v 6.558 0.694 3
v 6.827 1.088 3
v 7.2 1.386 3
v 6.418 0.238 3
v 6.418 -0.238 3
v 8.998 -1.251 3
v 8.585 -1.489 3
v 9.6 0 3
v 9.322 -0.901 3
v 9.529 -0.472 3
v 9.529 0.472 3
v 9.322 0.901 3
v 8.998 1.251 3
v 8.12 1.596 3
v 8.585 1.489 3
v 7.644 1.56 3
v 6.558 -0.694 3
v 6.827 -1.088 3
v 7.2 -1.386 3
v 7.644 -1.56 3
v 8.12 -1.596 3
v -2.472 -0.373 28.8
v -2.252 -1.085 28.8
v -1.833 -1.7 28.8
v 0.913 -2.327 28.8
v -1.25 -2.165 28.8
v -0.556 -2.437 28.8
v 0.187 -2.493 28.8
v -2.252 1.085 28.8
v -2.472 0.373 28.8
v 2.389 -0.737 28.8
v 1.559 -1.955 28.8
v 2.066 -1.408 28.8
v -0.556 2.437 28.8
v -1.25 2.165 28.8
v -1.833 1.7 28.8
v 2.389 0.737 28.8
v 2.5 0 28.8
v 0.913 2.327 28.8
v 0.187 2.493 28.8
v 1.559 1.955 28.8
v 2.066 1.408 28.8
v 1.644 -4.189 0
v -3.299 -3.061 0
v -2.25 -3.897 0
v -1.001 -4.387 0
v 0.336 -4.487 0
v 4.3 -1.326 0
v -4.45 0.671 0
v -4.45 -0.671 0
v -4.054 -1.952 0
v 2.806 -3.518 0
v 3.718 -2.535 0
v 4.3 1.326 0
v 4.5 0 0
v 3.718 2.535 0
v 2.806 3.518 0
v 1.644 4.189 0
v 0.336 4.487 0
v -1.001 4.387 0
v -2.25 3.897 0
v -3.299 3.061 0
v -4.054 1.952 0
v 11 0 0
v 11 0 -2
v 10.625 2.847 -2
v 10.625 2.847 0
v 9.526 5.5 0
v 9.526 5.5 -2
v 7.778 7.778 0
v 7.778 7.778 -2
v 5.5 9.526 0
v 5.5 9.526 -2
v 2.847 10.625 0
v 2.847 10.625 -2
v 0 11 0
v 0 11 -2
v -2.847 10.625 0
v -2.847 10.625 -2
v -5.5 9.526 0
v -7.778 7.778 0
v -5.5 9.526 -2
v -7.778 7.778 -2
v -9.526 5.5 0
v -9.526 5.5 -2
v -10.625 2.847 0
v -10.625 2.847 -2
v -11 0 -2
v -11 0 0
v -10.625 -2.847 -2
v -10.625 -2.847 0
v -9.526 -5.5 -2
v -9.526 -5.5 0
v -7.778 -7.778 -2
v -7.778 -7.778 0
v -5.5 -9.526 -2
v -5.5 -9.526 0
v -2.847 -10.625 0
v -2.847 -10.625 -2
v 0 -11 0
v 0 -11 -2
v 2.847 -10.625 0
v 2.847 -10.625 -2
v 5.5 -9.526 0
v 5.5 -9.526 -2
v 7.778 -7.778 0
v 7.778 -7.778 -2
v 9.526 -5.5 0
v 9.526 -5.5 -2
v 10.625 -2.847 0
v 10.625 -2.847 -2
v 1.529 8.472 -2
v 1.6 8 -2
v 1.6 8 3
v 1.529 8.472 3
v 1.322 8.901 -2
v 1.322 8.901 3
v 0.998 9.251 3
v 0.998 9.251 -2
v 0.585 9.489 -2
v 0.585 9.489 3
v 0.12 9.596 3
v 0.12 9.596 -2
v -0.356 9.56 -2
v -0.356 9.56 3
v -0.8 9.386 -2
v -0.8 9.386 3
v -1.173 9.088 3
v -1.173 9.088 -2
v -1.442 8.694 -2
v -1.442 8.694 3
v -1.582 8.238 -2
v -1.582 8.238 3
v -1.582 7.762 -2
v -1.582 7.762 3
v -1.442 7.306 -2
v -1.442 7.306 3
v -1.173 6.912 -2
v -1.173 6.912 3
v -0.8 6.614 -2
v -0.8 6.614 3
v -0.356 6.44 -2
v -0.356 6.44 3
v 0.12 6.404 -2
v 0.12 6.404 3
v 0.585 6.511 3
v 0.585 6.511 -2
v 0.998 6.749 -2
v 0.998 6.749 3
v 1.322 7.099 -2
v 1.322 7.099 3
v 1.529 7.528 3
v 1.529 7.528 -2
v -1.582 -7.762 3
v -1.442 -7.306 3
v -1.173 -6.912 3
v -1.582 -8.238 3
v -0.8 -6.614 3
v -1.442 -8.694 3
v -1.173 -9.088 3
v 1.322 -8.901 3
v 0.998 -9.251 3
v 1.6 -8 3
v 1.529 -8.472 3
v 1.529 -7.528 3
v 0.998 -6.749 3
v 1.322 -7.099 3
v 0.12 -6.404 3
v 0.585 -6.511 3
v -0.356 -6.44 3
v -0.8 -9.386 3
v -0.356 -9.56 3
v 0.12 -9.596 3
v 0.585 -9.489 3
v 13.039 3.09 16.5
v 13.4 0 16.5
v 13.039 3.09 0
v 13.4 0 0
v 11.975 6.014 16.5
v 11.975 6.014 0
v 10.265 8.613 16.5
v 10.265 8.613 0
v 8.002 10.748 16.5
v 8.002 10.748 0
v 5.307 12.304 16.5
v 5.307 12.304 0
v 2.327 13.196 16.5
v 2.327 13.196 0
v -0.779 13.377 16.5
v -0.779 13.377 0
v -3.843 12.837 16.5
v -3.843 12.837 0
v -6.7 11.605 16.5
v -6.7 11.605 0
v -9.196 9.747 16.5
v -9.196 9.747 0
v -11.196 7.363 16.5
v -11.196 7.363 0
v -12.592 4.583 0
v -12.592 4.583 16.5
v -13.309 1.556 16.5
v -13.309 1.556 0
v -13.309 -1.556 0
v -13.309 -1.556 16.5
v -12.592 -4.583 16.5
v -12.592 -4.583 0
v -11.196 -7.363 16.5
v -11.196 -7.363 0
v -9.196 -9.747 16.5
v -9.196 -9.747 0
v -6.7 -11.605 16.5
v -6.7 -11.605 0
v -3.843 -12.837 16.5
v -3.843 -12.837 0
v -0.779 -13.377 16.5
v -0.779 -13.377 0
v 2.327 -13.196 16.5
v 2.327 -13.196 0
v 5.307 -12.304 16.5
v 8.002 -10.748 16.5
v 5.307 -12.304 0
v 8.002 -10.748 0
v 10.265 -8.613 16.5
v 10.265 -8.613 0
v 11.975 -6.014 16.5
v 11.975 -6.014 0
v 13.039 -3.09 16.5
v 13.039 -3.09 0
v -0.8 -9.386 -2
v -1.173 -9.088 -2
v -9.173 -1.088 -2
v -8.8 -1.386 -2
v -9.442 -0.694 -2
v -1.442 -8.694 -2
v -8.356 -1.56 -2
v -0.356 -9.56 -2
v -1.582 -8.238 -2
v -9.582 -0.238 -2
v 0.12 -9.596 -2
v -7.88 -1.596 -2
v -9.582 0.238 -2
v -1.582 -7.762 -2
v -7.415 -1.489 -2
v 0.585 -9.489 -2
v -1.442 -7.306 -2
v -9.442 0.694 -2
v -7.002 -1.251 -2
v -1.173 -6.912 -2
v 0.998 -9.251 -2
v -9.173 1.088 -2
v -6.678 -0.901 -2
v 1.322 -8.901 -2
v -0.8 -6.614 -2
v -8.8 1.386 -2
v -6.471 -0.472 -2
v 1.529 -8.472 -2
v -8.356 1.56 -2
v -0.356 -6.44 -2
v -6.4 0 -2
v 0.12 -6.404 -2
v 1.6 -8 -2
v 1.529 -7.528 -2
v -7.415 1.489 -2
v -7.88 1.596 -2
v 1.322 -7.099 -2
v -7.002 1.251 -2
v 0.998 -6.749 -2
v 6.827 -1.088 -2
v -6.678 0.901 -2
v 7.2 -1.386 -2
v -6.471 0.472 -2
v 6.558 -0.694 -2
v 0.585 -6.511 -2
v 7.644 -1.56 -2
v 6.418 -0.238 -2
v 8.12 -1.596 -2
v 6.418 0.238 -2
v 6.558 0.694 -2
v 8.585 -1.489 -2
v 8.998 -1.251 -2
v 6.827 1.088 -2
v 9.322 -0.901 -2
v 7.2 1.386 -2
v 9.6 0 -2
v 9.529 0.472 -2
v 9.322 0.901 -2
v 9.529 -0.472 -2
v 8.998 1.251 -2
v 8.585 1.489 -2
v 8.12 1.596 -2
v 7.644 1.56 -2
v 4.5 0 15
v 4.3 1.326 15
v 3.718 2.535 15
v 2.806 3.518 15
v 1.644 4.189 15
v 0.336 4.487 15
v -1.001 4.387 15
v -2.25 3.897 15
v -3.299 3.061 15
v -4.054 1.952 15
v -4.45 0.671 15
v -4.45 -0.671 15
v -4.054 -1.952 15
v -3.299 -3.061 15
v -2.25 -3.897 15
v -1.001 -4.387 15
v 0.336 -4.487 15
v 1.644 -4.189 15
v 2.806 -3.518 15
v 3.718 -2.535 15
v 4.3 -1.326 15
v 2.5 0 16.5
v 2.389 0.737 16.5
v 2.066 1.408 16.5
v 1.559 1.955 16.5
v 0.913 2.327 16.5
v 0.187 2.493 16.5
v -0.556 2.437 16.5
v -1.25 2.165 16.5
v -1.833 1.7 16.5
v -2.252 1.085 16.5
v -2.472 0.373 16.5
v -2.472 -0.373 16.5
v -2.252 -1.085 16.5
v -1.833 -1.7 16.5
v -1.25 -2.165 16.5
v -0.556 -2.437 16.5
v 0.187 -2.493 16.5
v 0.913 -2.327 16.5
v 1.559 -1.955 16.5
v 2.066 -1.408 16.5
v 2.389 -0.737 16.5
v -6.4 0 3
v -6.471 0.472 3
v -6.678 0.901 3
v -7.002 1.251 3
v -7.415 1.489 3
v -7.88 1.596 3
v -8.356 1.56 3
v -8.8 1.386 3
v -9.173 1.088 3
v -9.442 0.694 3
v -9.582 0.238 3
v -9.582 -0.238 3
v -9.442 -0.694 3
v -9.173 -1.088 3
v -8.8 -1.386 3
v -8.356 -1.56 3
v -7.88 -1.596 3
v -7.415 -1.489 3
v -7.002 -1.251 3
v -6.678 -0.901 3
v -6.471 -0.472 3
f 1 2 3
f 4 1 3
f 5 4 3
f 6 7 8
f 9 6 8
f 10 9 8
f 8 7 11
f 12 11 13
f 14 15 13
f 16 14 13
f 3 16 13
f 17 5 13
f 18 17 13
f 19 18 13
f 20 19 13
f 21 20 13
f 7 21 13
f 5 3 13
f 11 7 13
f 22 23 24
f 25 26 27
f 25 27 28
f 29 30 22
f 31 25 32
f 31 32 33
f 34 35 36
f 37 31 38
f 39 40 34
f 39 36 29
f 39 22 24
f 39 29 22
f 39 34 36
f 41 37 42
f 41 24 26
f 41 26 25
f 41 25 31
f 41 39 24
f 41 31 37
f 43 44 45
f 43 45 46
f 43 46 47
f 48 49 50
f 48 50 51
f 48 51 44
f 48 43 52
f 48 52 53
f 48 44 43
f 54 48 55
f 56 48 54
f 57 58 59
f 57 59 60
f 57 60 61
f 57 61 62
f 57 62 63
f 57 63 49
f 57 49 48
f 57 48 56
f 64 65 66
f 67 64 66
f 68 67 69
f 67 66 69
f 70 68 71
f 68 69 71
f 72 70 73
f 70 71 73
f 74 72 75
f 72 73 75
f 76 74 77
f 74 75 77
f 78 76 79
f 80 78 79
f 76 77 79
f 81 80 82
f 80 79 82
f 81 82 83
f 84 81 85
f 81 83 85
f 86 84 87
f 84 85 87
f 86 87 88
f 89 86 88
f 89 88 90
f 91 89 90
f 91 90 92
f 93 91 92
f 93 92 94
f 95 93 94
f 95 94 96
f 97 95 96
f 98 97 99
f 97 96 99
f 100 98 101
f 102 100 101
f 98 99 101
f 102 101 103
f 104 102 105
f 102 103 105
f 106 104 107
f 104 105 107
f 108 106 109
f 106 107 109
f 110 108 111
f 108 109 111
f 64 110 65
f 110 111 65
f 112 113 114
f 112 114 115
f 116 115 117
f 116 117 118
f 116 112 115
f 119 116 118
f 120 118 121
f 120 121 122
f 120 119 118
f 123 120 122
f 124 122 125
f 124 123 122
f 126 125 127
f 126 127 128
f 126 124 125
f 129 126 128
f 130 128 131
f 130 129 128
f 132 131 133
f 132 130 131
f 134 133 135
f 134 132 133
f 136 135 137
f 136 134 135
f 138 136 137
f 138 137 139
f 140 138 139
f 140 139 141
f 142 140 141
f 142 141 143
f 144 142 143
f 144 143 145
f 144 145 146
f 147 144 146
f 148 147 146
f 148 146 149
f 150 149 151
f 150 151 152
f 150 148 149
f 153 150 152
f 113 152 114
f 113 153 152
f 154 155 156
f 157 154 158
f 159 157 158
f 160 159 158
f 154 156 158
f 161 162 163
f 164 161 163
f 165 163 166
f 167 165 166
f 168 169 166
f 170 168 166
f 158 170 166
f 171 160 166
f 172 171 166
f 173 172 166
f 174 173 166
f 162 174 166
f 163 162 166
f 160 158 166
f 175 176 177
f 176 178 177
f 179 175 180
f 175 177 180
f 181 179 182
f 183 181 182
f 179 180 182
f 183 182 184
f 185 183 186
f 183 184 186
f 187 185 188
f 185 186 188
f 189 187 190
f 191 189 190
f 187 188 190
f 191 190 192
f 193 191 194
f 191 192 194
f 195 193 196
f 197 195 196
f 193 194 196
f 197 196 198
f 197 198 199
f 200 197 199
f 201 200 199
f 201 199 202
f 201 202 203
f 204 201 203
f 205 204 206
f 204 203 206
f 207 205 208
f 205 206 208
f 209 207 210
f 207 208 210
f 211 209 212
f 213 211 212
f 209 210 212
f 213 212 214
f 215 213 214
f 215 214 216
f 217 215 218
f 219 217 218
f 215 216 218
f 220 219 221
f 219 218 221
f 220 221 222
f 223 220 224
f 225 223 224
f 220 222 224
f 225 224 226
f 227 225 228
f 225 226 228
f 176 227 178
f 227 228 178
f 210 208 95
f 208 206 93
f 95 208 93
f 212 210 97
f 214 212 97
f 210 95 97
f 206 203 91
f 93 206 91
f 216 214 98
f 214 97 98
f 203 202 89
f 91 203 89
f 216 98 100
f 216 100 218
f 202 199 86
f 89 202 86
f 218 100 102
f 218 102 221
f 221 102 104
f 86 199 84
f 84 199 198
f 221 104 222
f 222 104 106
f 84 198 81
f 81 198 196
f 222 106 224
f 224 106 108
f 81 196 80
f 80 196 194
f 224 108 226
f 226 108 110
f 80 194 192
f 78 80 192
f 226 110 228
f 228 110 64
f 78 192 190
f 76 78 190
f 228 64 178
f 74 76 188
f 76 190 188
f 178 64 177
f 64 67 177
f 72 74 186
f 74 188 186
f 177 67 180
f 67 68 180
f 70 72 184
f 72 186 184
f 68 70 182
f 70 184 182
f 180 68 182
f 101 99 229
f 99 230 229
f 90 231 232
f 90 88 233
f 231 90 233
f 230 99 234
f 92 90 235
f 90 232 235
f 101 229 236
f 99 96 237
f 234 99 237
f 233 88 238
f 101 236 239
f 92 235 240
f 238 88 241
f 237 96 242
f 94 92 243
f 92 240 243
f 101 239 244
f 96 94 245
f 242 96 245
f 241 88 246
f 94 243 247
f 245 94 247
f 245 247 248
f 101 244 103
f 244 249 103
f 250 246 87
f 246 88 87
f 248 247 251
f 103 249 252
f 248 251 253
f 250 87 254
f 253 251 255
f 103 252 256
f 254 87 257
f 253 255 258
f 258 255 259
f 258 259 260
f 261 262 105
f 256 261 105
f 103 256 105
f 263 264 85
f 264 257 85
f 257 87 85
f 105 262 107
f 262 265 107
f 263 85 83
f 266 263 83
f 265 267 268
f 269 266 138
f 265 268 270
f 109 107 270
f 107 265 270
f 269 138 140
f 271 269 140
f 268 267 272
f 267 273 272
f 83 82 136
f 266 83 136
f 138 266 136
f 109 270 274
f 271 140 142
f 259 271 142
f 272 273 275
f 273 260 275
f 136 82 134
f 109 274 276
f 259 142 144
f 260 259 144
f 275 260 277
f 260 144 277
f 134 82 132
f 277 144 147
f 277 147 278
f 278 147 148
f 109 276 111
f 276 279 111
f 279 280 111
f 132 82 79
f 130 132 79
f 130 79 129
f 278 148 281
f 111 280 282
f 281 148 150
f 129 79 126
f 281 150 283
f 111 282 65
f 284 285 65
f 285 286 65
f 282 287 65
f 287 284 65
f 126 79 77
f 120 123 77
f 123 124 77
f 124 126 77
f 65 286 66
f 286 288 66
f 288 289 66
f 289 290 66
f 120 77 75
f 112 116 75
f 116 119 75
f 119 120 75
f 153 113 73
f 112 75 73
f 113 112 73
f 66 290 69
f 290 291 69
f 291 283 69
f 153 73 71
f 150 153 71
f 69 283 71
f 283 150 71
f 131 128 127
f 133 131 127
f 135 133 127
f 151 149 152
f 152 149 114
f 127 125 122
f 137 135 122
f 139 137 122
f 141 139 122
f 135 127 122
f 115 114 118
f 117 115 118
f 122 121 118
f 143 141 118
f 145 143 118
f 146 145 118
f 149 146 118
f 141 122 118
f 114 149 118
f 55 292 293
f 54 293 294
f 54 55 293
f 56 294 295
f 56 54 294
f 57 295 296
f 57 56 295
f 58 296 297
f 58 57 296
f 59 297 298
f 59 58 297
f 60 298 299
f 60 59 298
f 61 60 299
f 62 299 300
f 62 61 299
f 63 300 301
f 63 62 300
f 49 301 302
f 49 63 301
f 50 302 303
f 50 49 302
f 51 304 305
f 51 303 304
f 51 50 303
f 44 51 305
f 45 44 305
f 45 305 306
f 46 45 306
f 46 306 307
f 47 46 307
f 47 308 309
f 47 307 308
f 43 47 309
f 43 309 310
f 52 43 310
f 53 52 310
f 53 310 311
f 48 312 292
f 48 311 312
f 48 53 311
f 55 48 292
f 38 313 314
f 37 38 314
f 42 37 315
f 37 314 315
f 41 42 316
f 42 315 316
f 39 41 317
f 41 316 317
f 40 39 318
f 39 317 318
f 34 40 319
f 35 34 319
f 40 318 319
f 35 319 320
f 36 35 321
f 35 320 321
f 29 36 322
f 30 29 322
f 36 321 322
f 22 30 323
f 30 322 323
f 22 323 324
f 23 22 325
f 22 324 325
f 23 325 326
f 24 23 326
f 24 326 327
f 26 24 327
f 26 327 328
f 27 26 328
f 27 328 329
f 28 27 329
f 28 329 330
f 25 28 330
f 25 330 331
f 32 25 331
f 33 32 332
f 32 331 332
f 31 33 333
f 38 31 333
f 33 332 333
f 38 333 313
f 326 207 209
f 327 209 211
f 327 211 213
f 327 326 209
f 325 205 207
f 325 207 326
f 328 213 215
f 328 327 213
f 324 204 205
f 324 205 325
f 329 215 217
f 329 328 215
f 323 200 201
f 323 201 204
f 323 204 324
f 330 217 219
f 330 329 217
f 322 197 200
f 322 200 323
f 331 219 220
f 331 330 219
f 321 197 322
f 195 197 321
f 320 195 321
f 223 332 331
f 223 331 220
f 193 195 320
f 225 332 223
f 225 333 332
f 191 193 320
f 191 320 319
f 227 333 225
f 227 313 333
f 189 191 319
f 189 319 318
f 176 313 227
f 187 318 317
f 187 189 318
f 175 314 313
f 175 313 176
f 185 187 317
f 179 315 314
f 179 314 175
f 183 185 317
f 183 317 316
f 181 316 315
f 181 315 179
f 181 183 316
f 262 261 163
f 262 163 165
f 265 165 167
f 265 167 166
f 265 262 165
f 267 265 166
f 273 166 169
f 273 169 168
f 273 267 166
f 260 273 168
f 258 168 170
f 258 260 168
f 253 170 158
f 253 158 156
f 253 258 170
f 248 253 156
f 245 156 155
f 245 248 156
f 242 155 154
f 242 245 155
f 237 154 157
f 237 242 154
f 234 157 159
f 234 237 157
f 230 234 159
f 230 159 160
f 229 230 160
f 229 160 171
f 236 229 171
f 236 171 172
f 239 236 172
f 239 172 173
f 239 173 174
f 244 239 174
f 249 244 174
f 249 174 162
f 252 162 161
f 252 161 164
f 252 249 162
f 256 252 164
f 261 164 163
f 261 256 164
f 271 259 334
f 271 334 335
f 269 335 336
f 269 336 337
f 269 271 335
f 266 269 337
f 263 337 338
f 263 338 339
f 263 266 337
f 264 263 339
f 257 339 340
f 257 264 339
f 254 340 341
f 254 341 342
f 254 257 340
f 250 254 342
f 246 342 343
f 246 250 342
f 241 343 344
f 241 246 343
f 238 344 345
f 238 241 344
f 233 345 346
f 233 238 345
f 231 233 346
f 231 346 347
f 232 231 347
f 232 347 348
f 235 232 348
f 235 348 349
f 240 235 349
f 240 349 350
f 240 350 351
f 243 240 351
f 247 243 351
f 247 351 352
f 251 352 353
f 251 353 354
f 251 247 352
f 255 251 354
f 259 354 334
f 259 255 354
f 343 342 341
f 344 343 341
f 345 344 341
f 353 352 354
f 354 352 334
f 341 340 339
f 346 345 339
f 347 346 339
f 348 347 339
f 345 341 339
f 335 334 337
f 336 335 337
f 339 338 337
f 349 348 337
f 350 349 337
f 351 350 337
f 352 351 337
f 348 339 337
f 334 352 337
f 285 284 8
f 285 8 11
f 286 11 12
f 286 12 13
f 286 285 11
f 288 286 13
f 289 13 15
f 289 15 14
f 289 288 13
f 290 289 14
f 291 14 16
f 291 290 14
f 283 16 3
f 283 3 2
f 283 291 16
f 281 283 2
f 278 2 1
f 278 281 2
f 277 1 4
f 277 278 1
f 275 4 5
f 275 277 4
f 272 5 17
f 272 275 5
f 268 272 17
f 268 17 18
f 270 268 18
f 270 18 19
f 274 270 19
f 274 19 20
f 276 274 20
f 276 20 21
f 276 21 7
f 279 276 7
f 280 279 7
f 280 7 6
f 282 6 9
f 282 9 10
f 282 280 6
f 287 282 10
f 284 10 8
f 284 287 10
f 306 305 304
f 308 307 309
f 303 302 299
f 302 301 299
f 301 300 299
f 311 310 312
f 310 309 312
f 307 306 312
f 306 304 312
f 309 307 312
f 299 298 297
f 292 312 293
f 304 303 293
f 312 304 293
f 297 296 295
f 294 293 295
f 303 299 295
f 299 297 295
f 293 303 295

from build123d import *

# Parameters (mm, degrees)
SKETCH_1_R        = 13.4
SKETCH_1_R_2      = 4.5
D26P8H18P5_DEPTH  = 16.5
EXTRUDE_START     = 15
SKETCH_2_R        = 13.4
EXTRUDE_292_DEPTH = 1.5
EXTRUDE_START_2   = -2
SKETCH_3_R        = 11
EXTRUDE_347_DEPTH = 2
EXTRUDE_START_3   = 16.5
SKETCH_4_R        = 2.5
EXTRUDE_M5_DEPTH  = 12.3
D16_M3_START      = -2
SKETCH_5_R        = 1.6
D16_M3_DEPTH      = 5


with BuildPart() as part:
    # 草图1 → 钟罩及定子总包络_D26p8H18p5 (new body)
    with BuildSketch(Plane.XY):
        Circle(SKETCH_1_R)
        Circle(SKETCH_1_R_2, mode=Mode.SUBTRACT)
    extrude(amount=D26P8H18P5_DEPTH)

    # 草图2 → Extrude 292 (add)
    with BuildSketch(Plane.XY.offset(EXTRUDE_START)):
        Circle(SKETCH_2_R)
    extrude(amount=EXTRUDE_292_DEPTH)

    # 草图3 → Extrude 347 (add)
    with BuildSketch(Plane.XY.offset(EXTRUDE_START_2)):
        Circle(SKETCH_3_R)
    extrude(amount=EXTRUDE_347_DEPTH)

    # 草图4 → M5桨轴包络 (add)
    with BuildSketch(Plane.XY.offset(EXTRUDE_START_3)):
        Circle(SKETCH_4_R)
    extrude(amount=EXTRUDE_M5_DEPTH)

    # 草图5 → D16分度圆四M3简化安装孔 (cut)
    with BuildSketch(Plane.XY.offset(D16_M3_START)):
        with Locations((-8, 0)):
            Circle(SKETCH_5_R)
        with Locations((0, -8)):
            Circle(SKETCH_5_R)
        with Locations((8, 0)):
            Circle(SKETCH_5_R)
        with Locations((0, 8)):
            Circle(SKETCH_5_R)
    extrude(amount=D16_M3_DEPTH, mode=Mode.SUBTRACT)


solid = part.part
